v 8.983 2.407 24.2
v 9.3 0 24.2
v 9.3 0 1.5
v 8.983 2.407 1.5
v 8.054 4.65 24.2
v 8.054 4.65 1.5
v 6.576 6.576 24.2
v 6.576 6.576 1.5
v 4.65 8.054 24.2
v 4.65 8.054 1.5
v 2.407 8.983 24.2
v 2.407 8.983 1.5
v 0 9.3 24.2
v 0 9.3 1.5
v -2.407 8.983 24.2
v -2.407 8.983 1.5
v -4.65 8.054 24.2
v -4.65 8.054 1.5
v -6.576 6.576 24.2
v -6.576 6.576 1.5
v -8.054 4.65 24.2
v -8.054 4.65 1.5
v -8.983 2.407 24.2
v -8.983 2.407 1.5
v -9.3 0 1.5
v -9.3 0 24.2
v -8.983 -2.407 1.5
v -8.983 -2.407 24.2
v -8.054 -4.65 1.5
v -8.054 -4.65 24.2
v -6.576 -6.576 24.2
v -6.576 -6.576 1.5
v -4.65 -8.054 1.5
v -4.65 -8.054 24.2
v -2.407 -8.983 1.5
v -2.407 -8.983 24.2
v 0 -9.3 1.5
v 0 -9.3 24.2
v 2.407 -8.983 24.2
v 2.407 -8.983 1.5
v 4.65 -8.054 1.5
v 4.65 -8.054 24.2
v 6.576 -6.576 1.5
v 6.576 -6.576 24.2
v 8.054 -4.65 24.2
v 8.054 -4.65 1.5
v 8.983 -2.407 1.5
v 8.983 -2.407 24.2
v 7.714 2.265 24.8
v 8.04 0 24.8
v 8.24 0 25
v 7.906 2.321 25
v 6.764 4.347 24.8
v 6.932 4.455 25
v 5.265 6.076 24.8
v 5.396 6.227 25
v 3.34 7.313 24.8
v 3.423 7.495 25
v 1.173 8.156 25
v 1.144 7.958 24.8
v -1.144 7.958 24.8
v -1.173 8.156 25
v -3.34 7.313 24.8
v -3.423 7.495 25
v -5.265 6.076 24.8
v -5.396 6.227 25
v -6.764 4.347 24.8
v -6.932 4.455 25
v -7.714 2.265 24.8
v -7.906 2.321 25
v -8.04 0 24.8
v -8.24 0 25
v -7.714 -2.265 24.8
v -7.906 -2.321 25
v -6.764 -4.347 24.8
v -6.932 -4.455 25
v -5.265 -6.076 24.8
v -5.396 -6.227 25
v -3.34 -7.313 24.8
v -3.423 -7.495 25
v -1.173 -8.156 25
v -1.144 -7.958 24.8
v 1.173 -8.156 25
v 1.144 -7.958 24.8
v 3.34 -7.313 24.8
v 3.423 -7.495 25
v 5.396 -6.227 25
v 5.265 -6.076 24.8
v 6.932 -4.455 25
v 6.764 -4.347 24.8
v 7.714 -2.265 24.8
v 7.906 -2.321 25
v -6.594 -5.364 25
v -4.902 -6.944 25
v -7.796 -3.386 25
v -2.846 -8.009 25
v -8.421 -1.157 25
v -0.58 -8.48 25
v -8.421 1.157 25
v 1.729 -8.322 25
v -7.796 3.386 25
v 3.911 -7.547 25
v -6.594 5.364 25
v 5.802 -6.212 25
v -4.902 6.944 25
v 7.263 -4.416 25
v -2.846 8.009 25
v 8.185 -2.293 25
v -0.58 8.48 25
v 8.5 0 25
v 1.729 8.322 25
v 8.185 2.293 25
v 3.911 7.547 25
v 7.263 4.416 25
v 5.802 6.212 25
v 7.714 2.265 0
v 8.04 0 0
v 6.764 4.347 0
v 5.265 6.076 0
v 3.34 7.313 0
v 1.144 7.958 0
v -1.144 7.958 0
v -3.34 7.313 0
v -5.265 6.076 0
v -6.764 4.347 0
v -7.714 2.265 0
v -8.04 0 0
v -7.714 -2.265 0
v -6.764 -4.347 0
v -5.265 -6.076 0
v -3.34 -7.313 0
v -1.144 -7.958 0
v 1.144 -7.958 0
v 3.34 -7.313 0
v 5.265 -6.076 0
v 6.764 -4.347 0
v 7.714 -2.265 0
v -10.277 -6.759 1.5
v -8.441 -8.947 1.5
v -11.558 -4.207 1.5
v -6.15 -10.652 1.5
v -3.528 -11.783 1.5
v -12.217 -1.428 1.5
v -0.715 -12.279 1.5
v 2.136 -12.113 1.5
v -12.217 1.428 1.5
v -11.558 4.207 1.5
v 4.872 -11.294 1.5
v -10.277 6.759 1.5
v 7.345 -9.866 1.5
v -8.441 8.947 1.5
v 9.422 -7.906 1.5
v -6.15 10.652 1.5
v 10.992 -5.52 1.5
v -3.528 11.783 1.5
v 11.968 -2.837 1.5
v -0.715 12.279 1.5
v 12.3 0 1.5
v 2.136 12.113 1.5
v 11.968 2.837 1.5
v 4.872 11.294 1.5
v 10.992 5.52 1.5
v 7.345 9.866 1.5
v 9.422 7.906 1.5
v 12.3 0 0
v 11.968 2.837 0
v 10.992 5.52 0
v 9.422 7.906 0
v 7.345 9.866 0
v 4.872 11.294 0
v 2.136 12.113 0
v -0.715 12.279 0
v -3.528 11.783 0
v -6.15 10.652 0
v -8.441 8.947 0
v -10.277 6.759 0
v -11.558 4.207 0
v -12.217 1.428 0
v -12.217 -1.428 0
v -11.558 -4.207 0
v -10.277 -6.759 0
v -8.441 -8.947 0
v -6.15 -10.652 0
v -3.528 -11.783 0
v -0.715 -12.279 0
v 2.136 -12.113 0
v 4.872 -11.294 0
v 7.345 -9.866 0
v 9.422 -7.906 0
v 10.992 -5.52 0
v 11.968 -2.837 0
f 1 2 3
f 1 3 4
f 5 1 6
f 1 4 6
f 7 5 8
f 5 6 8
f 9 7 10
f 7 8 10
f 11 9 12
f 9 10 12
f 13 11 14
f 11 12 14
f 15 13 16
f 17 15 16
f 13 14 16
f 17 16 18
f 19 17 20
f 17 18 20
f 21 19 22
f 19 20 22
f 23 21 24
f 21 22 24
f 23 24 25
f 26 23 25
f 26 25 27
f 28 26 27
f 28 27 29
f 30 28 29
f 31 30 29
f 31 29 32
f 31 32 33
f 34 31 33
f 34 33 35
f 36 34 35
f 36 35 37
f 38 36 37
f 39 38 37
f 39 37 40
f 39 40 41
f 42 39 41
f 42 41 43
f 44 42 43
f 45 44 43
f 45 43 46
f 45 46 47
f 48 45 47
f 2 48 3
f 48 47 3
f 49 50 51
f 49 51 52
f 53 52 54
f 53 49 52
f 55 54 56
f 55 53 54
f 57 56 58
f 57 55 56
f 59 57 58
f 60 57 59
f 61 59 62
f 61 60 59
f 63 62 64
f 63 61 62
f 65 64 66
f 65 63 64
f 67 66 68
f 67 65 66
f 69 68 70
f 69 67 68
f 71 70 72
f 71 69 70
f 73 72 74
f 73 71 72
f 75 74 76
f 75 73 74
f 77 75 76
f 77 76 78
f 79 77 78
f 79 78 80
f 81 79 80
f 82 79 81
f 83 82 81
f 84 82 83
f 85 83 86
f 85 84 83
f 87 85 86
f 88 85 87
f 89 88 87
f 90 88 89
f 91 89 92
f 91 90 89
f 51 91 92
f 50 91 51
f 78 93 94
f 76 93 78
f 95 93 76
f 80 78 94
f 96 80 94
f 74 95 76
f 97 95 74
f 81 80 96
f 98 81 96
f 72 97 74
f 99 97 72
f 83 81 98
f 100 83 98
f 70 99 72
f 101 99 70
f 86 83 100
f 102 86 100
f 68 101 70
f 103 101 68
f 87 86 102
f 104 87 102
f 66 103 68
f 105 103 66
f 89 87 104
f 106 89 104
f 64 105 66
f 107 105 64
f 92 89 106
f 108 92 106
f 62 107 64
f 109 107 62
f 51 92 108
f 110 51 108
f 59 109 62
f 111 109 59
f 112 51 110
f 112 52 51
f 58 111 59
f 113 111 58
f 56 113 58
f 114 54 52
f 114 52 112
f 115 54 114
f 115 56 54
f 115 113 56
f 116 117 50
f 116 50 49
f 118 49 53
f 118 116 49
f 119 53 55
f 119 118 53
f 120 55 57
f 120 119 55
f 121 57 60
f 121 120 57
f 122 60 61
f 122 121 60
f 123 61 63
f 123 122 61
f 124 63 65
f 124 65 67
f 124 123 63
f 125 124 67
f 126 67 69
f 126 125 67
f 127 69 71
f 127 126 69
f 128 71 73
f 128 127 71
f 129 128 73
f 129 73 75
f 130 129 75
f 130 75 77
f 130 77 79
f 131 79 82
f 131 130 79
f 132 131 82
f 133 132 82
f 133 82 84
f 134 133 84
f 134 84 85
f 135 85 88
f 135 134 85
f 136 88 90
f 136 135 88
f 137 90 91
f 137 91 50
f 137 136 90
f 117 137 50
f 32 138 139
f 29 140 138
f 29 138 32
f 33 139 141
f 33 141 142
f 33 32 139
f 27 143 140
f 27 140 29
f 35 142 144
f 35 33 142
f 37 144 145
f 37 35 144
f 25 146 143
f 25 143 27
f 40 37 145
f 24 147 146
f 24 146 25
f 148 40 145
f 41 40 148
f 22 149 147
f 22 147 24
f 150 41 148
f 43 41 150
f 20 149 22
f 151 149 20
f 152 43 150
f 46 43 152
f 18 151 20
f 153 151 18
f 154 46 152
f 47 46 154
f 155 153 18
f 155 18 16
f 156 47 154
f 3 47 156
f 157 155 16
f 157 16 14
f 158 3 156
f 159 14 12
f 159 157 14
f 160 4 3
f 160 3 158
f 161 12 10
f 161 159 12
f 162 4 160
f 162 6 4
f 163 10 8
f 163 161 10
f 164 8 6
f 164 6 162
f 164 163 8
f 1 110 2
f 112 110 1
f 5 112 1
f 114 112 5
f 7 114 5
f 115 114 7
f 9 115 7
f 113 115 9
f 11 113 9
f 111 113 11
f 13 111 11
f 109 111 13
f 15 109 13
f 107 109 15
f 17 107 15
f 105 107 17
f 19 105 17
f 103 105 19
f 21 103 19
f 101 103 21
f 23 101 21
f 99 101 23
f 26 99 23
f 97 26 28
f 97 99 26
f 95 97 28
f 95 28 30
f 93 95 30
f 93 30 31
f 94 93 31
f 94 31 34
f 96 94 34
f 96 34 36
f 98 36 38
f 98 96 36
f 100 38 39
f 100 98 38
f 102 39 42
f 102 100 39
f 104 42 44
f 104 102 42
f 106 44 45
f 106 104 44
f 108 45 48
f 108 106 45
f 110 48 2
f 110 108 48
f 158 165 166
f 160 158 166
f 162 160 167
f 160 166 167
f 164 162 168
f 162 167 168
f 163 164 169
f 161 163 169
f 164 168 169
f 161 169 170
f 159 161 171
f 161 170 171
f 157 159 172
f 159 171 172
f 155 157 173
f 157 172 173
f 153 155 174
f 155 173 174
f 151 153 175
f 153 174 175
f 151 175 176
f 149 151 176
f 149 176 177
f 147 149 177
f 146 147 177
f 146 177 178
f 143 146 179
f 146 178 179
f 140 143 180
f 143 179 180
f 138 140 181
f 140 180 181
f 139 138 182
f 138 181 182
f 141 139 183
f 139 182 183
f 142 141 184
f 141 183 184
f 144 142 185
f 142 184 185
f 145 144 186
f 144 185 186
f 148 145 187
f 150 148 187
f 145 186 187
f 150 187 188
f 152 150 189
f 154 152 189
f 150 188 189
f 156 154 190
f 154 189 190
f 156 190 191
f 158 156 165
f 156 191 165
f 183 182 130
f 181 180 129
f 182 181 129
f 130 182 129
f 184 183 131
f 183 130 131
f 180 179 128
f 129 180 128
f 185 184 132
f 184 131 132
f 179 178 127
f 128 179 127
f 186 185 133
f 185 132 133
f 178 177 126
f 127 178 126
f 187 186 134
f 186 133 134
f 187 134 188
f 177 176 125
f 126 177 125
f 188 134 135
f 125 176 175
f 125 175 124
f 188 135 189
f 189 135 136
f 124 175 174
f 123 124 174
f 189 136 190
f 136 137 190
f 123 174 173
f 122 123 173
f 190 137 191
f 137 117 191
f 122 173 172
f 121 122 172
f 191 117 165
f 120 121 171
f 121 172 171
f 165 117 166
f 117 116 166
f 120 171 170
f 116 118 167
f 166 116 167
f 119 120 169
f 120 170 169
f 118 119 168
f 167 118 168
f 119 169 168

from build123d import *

# Parameters (mm, degrees)
F0_R     = 12.3
F0_R_2   = 9.3
F1_DEPTH = 1.5
F0_R_3   = 8.04
F2_DEPTH = 25
F3_SIZE  = 0.8
F4_SIZE  = 0.2


with BuildPart() as f1:
    # F0 (on Top) → F1 (new body)
    with BuildSketch(Plane.XY):
        Circle(F0_R)
        Circle(F0_R_2, mode=Mode.SUBTRACT)
    extrude(amount=F1_DEPTH)

    # F0 (on Top) → F2 (join)
    with BuildSketch(Plane.XY):
        Circle(F0_R_2)
        Circle(F0_R_3, mode=Mode.SUBTRACT)
    extrude(amount=F2_DEPTH)

    # F3
    f3_edges = [f1.edges().sort_by_distance(p)[0] for p in [
        (-9.3, 0, 25),
    ]]
    chamfer(f3_edges, length=F3_SIZE)

    # F4
    f4_edges = [f1.edges().sort_by_distance(p)[0] for p in [
        (-8.04, 0, 25),
    ]]
    chamfer(f4_edges, length=F4_SIZE)


solid = f1.part
